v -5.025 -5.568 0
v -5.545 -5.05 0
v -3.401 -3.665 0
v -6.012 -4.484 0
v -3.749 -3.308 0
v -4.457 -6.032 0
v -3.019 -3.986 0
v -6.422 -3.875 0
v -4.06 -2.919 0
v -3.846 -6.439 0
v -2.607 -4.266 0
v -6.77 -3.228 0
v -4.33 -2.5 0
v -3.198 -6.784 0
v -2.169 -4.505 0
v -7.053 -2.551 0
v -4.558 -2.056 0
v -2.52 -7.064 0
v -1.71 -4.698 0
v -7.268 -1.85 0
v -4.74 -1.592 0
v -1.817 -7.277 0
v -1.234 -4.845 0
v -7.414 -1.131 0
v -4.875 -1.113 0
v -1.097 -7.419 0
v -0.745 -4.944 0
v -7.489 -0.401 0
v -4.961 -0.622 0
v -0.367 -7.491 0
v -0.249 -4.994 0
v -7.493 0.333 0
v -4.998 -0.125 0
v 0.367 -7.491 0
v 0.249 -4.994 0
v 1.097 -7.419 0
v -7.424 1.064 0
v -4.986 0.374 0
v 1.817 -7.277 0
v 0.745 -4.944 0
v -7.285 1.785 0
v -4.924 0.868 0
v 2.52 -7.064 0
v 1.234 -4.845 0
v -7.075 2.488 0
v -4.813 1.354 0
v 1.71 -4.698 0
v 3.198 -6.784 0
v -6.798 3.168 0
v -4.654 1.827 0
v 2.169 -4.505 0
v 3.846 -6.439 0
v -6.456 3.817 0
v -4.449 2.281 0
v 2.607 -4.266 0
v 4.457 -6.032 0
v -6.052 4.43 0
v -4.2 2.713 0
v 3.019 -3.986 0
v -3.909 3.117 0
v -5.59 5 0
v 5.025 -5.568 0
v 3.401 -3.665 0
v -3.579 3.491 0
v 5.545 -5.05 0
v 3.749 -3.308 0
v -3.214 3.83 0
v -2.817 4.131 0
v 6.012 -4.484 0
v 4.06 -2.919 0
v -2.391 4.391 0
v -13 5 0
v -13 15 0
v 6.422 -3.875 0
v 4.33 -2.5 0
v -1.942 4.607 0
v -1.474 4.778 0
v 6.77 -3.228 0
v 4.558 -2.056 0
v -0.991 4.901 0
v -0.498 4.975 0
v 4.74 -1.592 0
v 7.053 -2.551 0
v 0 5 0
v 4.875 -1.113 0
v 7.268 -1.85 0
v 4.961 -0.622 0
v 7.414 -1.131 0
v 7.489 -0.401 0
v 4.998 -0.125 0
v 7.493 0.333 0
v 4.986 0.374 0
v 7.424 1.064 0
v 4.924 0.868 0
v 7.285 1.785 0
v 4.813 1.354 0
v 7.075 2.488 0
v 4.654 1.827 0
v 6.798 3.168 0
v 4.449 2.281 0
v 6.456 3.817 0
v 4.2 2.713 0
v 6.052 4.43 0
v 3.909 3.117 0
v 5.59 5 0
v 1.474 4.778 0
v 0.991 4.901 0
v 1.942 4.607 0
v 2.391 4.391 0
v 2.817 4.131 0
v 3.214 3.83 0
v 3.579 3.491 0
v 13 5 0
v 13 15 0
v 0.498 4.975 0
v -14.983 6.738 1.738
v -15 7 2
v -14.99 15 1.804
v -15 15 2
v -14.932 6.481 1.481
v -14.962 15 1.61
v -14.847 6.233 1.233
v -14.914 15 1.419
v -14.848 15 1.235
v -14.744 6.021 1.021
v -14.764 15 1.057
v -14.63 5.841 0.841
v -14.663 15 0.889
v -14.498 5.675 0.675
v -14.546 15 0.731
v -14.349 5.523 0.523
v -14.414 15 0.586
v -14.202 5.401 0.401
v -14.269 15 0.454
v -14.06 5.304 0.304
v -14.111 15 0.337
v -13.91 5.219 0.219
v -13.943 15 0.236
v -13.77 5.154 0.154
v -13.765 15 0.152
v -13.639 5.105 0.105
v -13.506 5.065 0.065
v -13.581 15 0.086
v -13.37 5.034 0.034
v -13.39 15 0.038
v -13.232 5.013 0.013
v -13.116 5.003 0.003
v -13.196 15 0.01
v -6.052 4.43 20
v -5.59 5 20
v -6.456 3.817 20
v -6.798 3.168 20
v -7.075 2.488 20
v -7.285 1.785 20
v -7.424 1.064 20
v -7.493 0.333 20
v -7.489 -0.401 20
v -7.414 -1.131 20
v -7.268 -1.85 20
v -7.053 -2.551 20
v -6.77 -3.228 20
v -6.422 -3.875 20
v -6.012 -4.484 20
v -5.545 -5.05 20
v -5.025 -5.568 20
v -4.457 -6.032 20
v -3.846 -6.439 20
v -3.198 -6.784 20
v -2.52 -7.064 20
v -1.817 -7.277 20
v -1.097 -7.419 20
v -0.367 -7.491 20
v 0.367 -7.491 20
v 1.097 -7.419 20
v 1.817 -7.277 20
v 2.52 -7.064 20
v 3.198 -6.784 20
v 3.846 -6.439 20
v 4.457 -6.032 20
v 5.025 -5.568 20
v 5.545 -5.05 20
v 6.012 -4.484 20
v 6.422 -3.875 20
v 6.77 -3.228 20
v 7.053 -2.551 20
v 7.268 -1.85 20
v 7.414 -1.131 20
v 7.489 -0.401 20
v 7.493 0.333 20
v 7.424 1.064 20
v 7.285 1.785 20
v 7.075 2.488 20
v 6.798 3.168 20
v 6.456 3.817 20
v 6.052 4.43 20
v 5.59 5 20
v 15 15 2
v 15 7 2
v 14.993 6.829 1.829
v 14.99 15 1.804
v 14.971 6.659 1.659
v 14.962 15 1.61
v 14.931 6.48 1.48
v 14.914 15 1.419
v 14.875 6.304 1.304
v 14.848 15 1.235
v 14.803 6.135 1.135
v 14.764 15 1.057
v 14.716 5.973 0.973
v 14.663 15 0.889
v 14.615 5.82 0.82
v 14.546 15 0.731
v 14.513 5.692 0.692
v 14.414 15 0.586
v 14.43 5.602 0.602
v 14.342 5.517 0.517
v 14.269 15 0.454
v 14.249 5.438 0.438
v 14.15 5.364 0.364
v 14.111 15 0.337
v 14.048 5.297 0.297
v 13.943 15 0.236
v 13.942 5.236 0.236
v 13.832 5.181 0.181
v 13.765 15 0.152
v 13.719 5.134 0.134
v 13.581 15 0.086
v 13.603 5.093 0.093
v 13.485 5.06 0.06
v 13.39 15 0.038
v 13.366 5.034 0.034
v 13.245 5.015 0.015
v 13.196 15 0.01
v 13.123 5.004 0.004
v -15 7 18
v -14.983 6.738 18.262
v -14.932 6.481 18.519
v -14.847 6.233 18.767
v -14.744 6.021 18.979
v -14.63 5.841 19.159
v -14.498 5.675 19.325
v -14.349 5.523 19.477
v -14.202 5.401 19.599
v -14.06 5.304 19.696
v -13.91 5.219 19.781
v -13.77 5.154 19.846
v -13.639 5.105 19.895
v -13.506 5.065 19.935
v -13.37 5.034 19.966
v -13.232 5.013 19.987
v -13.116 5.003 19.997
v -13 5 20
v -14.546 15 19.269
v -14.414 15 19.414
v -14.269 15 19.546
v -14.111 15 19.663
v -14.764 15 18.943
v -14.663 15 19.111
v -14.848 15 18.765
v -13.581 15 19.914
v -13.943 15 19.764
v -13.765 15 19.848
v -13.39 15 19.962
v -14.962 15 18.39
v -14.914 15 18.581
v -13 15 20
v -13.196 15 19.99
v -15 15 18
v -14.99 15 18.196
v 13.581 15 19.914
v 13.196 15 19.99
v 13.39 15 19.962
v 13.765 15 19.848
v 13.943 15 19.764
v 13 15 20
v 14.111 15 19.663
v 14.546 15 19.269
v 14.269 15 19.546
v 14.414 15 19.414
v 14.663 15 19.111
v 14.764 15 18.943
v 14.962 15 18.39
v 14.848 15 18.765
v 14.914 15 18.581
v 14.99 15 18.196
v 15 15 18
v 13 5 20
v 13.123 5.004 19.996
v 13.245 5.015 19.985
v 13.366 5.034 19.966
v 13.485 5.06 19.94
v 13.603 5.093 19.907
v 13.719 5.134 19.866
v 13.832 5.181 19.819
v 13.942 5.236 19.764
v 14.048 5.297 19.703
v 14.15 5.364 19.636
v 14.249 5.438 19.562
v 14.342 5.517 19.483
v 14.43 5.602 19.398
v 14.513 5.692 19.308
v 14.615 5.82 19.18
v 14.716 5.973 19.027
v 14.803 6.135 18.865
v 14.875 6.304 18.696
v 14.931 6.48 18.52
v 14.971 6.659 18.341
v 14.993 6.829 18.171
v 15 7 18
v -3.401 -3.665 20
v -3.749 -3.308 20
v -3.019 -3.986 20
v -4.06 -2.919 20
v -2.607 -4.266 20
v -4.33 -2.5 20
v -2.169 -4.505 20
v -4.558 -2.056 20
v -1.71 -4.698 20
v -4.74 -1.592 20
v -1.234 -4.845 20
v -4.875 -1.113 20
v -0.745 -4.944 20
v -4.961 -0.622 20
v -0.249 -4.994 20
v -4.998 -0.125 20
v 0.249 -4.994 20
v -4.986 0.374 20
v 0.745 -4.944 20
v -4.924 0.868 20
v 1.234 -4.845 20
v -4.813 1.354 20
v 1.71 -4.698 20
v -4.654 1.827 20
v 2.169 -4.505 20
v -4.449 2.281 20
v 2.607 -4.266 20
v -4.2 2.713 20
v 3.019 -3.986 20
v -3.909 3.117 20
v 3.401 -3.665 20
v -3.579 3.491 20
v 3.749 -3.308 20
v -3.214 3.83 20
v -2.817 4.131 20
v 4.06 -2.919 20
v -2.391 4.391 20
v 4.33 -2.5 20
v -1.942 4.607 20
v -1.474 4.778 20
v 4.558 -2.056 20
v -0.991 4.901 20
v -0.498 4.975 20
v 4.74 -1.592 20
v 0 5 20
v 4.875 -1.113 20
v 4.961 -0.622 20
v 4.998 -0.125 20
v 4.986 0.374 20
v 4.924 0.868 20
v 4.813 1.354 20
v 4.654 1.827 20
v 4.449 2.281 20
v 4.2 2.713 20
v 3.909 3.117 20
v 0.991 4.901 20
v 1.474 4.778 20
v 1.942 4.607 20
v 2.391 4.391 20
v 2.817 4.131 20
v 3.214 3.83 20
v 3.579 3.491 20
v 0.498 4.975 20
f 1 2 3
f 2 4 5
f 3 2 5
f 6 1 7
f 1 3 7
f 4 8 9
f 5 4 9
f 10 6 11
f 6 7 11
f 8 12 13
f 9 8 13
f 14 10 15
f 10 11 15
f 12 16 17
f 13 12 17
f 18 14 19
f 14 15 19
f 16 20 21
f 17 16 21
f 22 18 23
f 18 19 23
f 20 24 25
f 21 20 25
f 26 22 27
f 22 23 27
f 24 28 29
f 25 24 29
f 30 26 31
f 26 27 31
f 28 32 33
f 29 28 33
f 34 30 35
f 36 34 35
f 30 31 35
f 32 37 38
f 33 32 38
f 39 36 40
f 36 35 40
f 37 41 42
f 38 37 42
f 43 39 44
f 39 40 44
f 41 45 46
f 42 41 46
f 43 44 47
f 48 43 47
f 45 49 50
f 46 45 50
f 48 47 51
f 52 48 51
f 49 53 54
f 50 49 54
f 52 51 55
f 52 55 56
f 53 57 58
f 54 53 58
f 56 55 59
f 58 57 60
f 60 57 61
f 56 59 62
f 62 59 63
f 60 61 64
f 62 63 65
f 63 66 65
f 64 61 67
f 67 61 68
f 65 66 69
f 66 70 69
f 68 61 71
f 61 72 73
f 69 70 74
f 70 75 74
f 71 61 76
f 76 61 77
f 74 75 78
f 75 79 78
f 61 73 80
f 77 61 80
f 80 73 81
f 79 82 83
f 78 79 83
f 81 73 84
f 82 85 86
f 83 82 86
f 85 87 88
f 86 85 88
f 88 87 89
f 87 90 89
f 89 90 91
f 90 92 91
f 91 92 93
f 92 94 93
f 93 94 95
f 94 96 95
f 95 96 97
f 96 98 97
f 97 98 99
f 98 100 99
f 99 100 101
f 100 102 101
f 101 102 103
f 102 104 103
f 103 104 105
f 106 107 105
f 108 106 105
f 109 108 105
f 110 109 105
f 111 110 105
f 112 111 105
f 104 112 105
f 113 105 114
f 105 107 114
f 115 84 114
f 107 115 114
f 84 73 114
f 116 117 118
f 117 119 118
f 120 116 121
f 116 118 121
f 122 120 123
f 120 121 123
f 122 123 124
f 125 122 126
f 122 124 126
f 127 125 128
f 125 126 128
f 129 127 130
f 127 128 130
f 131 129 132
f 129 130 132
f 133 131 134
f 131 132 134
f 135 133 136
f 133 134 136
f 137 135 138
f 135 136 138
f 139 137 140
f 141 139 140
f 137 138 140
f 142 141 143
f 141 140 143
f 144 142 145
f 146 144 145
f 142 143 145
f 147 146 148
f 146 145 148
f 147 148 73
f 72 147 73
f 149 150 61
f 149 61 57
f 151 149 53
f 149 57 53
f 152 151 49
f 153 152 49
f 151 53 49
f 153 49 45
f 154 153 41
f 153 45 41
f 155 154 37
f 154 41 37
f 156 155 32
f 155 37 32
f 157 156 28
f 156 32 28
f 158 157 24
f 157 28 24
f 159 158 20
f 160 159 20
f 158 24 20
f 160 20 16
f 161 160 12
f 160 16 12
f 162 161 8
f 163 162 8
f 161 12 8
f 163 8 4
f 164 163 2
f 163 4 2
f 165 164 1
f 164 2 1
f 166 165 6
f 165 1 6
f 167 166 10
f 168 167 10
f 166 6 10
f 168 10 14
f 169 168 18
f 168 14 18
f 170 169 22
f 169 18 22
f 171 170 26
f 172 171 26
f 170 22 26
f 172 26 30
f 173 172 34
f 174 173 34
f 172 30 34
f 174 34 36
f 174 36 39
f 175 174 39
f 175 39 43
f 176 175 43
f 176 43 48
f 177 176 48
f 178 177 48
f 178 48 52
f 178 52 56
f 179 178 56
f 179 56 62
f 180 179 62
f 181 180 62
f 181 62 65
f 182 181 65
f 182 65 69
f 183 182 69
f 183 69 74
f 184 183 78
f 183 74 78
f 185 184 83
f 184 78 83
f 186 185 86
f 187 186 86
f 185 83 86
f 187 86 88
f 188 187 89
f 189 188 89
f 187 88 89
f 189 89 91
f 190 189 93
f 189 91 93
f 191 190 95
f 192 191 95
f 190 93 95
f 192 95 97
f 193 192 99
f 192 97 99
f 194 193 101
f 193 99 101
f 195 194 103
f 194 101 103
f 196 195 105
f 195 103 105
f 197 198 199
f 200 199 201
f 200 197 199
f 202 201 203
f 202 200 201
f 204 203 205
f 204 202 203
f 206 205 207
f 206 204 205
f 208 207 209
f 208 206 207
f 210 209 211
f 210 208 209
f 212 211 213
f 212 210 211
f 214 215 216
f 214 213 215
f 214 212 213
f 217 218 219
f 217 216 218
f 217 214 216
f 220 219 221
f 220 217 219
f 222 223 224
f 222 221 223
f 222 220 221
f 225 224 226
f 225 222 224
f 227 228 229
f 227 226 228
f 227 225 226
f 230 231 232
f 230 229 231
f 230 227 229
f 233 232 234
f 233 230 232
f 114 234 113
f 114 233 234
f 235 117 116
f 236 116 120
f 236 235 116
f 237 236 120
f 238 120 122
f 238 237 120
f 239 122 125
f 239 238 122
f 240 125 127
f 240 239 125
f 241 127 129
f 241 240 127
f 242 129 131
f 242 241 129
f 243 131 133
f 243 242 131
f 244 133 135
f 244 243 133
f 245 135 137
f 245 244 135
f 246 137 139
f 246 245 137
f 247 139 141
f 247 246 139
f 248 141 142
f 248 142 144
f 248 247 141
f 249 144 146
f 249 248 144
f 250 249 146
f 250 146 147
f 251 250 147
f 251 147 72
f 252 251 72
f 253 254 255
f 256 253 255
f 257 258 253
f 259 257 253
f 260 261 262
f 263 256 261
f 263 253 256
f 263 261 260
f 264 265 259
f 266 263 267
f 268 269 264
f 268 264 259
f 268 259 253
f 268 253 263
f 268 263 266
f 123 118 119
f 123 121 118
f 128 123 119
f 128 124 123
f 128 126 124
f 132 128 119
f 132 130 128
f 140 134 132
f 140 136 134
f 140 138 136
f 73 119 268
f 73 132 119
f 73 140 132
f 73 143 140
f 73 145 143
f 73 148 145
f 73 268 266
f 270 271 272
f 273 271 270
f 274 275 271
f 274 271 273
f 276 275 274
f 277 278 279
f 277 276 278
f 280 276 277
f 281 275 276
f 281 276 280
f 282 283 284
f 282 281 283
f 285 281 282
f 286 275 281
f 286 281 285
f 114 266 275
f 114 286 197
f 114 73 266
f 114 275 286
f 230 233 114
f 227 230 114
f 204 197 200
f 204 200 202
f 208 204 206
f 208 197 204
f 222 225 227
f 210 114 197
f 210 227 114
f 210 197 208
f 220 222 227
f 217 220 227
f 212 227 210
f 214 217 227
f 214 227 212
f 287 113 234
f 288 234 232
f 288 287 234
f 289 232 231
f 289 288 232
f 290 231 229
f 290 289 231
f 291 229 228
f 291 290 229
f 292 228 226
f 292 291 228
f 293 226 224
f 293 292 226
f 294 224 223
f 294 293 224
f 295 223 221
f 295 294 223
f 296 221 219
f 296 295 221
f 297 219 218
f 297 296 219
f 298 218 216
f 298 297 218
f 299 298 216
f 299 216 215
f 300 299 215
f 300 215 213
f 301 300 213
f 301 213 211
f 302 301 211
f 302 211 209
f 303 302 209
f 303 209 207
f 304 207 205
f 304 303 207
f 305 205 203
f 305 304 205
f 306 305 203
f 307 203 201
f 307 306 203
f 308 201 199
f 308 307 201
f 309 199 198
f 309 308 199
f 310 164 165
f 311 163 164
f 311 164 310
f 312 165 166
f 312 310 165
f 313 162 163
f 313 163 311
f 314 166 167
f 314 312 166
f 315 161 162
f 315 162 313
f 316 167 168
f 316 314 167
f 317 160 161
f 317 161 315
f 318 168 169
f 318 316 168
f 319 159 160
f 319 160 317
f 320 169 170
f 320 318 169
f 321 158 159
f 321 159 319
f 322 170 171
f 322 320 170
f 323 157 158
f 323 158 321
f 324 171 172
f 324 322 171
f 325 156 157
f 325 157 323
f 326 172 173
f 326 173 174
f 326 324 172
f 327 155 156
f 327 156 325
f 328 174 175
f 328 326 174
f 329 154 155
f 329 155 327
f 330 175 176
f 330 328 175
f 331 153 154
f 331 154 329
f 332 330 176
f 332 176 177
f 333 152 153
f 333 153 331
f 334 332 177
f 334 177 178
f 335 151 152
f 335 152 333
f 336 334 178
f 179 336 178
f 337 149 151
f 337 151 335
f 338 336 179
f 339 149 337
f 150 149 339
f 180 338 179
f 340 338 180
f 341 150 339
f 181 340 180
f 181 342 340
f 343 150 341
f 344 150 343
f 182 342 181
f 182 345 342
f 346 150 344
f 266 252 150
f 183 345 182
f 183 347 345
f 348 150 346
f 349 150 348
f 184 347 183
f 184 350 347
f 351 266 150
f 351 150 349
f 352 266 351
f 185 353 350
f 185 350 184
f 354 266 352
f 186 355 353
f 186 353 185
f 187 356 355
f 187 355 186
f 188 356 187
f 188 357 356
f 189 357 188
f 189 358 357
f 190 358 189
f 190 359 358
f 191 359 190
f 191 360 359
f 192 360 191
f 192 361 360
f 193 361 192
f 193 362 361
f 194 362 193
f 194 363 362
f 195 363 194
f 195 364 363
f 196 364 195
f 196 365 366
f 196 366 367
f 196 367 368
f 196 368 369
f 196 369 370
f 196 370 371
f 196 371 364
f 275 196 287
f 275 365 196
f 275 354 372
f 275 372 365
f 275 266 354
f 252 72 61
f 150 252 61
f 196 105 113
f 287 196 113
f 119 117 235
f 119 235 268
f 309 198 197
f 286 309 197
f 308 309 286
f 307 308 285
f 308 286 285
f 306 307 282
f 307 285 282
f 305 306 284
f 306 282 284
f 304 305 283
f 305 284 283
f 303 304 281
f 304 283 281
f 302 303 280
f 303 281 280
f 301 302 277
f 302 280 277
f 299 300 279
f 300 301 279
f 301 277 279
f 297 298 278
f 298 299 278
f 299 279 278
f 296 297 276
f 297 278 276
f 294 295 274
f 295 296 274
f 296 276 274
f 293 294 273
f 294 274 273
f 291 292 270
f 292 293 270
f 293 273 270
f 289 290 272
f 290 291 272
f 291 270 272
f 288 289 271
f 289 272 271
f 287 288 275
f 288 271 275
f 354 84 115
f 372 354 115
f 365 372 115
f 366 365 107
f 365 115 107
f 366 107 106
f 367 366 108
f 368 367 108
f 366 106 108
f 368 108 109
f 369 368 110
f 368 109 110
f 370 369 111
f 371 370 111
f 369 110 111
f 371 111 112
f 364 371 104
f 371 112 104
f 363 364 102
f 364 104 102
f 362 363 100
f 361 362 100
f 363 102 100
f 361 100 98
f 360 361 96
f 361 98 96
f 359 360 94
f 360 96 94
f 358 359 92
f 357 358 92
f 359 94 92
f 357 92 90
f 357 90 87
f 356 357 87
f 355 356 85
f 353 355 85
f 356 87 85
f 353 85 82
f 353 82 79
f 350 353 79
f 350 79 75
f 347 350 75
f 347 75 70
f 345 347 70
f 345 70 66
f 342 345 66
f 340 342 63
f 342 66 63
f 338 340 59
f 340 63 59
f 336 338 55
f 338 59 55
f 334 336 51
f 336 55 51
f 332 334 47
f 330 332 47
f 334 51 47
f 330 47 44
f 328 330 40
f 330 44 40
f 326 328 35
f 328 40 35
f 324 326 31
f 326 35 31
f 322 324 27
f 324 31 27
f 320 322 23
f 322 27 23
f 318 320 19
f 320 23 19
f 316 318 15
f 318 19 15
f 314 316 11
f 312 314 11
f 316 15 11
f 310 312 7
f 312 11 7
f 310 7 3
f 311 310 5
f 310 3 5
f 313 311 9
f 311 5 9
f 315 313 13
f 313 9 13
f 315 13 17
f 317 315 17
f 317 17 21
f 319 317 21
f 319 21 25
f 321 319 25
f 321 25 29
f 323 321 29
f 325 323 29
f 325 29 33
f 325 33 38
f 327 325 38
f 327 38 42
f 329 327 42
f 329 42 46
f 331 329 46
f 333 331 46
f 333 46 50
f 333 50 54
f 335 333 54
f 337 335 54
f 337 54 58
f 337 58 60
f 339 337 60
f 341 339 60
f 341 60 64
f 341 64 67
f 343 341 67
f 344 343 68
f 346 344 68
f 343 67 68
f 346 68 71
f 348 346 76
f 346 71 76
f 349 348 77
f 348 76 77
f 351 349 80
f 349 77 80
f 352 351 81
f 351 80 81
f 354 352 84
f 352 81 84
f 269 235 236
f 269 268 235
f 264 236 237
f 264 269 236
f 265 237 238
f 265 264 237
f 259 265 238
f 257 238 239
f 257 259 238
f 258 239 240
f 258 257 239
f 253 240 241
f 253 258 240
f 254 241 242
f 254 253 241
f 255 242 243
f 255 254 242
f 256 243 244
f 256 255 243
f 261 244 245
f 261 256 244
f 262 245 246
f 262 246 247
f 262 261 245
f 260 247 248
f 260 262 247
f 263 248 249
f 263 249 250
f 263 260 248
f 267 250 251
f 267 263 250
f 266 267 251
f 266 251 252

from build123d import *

# Parameters (mm, degrees)
SKETCH1_R           = 7.5
SKETCH1_R_2         = 5
SKETCH1_W           = 30
SKETCH1_H           = 10
BOSS_EXTRUDE1_DEPTH = 20
FILLET1_R           = 2


with BuildPart() as part:
    # Sketch1 → Boss-Extrude1 (new body)
    with BuildSketch(Plane.XY):
        Circle(SKETCH1_R)
        Circle(SKETCH1_R_2, mode=Mode.SUBTRACT)
        with Locations((0, 10)):
            Rectangle(SKETCH1_W, SKETCH1_H)
    extrude(amount=BOSS_EXTRUDE1_DEPTH)

    # Fillet1
    fillet1_edges = [part.edges().sort_by_distance(p)[0] for p in [
        (-15, 5, 10),
        (15, 5, 10),
        (15, 10, 20),
        (-15, 10, 20),
        (-15, 10, 0),
        (15, 10, 0),
    ]]
    fillet(fillet1_edges, radius=FILLET1_R)


solid = part.part
